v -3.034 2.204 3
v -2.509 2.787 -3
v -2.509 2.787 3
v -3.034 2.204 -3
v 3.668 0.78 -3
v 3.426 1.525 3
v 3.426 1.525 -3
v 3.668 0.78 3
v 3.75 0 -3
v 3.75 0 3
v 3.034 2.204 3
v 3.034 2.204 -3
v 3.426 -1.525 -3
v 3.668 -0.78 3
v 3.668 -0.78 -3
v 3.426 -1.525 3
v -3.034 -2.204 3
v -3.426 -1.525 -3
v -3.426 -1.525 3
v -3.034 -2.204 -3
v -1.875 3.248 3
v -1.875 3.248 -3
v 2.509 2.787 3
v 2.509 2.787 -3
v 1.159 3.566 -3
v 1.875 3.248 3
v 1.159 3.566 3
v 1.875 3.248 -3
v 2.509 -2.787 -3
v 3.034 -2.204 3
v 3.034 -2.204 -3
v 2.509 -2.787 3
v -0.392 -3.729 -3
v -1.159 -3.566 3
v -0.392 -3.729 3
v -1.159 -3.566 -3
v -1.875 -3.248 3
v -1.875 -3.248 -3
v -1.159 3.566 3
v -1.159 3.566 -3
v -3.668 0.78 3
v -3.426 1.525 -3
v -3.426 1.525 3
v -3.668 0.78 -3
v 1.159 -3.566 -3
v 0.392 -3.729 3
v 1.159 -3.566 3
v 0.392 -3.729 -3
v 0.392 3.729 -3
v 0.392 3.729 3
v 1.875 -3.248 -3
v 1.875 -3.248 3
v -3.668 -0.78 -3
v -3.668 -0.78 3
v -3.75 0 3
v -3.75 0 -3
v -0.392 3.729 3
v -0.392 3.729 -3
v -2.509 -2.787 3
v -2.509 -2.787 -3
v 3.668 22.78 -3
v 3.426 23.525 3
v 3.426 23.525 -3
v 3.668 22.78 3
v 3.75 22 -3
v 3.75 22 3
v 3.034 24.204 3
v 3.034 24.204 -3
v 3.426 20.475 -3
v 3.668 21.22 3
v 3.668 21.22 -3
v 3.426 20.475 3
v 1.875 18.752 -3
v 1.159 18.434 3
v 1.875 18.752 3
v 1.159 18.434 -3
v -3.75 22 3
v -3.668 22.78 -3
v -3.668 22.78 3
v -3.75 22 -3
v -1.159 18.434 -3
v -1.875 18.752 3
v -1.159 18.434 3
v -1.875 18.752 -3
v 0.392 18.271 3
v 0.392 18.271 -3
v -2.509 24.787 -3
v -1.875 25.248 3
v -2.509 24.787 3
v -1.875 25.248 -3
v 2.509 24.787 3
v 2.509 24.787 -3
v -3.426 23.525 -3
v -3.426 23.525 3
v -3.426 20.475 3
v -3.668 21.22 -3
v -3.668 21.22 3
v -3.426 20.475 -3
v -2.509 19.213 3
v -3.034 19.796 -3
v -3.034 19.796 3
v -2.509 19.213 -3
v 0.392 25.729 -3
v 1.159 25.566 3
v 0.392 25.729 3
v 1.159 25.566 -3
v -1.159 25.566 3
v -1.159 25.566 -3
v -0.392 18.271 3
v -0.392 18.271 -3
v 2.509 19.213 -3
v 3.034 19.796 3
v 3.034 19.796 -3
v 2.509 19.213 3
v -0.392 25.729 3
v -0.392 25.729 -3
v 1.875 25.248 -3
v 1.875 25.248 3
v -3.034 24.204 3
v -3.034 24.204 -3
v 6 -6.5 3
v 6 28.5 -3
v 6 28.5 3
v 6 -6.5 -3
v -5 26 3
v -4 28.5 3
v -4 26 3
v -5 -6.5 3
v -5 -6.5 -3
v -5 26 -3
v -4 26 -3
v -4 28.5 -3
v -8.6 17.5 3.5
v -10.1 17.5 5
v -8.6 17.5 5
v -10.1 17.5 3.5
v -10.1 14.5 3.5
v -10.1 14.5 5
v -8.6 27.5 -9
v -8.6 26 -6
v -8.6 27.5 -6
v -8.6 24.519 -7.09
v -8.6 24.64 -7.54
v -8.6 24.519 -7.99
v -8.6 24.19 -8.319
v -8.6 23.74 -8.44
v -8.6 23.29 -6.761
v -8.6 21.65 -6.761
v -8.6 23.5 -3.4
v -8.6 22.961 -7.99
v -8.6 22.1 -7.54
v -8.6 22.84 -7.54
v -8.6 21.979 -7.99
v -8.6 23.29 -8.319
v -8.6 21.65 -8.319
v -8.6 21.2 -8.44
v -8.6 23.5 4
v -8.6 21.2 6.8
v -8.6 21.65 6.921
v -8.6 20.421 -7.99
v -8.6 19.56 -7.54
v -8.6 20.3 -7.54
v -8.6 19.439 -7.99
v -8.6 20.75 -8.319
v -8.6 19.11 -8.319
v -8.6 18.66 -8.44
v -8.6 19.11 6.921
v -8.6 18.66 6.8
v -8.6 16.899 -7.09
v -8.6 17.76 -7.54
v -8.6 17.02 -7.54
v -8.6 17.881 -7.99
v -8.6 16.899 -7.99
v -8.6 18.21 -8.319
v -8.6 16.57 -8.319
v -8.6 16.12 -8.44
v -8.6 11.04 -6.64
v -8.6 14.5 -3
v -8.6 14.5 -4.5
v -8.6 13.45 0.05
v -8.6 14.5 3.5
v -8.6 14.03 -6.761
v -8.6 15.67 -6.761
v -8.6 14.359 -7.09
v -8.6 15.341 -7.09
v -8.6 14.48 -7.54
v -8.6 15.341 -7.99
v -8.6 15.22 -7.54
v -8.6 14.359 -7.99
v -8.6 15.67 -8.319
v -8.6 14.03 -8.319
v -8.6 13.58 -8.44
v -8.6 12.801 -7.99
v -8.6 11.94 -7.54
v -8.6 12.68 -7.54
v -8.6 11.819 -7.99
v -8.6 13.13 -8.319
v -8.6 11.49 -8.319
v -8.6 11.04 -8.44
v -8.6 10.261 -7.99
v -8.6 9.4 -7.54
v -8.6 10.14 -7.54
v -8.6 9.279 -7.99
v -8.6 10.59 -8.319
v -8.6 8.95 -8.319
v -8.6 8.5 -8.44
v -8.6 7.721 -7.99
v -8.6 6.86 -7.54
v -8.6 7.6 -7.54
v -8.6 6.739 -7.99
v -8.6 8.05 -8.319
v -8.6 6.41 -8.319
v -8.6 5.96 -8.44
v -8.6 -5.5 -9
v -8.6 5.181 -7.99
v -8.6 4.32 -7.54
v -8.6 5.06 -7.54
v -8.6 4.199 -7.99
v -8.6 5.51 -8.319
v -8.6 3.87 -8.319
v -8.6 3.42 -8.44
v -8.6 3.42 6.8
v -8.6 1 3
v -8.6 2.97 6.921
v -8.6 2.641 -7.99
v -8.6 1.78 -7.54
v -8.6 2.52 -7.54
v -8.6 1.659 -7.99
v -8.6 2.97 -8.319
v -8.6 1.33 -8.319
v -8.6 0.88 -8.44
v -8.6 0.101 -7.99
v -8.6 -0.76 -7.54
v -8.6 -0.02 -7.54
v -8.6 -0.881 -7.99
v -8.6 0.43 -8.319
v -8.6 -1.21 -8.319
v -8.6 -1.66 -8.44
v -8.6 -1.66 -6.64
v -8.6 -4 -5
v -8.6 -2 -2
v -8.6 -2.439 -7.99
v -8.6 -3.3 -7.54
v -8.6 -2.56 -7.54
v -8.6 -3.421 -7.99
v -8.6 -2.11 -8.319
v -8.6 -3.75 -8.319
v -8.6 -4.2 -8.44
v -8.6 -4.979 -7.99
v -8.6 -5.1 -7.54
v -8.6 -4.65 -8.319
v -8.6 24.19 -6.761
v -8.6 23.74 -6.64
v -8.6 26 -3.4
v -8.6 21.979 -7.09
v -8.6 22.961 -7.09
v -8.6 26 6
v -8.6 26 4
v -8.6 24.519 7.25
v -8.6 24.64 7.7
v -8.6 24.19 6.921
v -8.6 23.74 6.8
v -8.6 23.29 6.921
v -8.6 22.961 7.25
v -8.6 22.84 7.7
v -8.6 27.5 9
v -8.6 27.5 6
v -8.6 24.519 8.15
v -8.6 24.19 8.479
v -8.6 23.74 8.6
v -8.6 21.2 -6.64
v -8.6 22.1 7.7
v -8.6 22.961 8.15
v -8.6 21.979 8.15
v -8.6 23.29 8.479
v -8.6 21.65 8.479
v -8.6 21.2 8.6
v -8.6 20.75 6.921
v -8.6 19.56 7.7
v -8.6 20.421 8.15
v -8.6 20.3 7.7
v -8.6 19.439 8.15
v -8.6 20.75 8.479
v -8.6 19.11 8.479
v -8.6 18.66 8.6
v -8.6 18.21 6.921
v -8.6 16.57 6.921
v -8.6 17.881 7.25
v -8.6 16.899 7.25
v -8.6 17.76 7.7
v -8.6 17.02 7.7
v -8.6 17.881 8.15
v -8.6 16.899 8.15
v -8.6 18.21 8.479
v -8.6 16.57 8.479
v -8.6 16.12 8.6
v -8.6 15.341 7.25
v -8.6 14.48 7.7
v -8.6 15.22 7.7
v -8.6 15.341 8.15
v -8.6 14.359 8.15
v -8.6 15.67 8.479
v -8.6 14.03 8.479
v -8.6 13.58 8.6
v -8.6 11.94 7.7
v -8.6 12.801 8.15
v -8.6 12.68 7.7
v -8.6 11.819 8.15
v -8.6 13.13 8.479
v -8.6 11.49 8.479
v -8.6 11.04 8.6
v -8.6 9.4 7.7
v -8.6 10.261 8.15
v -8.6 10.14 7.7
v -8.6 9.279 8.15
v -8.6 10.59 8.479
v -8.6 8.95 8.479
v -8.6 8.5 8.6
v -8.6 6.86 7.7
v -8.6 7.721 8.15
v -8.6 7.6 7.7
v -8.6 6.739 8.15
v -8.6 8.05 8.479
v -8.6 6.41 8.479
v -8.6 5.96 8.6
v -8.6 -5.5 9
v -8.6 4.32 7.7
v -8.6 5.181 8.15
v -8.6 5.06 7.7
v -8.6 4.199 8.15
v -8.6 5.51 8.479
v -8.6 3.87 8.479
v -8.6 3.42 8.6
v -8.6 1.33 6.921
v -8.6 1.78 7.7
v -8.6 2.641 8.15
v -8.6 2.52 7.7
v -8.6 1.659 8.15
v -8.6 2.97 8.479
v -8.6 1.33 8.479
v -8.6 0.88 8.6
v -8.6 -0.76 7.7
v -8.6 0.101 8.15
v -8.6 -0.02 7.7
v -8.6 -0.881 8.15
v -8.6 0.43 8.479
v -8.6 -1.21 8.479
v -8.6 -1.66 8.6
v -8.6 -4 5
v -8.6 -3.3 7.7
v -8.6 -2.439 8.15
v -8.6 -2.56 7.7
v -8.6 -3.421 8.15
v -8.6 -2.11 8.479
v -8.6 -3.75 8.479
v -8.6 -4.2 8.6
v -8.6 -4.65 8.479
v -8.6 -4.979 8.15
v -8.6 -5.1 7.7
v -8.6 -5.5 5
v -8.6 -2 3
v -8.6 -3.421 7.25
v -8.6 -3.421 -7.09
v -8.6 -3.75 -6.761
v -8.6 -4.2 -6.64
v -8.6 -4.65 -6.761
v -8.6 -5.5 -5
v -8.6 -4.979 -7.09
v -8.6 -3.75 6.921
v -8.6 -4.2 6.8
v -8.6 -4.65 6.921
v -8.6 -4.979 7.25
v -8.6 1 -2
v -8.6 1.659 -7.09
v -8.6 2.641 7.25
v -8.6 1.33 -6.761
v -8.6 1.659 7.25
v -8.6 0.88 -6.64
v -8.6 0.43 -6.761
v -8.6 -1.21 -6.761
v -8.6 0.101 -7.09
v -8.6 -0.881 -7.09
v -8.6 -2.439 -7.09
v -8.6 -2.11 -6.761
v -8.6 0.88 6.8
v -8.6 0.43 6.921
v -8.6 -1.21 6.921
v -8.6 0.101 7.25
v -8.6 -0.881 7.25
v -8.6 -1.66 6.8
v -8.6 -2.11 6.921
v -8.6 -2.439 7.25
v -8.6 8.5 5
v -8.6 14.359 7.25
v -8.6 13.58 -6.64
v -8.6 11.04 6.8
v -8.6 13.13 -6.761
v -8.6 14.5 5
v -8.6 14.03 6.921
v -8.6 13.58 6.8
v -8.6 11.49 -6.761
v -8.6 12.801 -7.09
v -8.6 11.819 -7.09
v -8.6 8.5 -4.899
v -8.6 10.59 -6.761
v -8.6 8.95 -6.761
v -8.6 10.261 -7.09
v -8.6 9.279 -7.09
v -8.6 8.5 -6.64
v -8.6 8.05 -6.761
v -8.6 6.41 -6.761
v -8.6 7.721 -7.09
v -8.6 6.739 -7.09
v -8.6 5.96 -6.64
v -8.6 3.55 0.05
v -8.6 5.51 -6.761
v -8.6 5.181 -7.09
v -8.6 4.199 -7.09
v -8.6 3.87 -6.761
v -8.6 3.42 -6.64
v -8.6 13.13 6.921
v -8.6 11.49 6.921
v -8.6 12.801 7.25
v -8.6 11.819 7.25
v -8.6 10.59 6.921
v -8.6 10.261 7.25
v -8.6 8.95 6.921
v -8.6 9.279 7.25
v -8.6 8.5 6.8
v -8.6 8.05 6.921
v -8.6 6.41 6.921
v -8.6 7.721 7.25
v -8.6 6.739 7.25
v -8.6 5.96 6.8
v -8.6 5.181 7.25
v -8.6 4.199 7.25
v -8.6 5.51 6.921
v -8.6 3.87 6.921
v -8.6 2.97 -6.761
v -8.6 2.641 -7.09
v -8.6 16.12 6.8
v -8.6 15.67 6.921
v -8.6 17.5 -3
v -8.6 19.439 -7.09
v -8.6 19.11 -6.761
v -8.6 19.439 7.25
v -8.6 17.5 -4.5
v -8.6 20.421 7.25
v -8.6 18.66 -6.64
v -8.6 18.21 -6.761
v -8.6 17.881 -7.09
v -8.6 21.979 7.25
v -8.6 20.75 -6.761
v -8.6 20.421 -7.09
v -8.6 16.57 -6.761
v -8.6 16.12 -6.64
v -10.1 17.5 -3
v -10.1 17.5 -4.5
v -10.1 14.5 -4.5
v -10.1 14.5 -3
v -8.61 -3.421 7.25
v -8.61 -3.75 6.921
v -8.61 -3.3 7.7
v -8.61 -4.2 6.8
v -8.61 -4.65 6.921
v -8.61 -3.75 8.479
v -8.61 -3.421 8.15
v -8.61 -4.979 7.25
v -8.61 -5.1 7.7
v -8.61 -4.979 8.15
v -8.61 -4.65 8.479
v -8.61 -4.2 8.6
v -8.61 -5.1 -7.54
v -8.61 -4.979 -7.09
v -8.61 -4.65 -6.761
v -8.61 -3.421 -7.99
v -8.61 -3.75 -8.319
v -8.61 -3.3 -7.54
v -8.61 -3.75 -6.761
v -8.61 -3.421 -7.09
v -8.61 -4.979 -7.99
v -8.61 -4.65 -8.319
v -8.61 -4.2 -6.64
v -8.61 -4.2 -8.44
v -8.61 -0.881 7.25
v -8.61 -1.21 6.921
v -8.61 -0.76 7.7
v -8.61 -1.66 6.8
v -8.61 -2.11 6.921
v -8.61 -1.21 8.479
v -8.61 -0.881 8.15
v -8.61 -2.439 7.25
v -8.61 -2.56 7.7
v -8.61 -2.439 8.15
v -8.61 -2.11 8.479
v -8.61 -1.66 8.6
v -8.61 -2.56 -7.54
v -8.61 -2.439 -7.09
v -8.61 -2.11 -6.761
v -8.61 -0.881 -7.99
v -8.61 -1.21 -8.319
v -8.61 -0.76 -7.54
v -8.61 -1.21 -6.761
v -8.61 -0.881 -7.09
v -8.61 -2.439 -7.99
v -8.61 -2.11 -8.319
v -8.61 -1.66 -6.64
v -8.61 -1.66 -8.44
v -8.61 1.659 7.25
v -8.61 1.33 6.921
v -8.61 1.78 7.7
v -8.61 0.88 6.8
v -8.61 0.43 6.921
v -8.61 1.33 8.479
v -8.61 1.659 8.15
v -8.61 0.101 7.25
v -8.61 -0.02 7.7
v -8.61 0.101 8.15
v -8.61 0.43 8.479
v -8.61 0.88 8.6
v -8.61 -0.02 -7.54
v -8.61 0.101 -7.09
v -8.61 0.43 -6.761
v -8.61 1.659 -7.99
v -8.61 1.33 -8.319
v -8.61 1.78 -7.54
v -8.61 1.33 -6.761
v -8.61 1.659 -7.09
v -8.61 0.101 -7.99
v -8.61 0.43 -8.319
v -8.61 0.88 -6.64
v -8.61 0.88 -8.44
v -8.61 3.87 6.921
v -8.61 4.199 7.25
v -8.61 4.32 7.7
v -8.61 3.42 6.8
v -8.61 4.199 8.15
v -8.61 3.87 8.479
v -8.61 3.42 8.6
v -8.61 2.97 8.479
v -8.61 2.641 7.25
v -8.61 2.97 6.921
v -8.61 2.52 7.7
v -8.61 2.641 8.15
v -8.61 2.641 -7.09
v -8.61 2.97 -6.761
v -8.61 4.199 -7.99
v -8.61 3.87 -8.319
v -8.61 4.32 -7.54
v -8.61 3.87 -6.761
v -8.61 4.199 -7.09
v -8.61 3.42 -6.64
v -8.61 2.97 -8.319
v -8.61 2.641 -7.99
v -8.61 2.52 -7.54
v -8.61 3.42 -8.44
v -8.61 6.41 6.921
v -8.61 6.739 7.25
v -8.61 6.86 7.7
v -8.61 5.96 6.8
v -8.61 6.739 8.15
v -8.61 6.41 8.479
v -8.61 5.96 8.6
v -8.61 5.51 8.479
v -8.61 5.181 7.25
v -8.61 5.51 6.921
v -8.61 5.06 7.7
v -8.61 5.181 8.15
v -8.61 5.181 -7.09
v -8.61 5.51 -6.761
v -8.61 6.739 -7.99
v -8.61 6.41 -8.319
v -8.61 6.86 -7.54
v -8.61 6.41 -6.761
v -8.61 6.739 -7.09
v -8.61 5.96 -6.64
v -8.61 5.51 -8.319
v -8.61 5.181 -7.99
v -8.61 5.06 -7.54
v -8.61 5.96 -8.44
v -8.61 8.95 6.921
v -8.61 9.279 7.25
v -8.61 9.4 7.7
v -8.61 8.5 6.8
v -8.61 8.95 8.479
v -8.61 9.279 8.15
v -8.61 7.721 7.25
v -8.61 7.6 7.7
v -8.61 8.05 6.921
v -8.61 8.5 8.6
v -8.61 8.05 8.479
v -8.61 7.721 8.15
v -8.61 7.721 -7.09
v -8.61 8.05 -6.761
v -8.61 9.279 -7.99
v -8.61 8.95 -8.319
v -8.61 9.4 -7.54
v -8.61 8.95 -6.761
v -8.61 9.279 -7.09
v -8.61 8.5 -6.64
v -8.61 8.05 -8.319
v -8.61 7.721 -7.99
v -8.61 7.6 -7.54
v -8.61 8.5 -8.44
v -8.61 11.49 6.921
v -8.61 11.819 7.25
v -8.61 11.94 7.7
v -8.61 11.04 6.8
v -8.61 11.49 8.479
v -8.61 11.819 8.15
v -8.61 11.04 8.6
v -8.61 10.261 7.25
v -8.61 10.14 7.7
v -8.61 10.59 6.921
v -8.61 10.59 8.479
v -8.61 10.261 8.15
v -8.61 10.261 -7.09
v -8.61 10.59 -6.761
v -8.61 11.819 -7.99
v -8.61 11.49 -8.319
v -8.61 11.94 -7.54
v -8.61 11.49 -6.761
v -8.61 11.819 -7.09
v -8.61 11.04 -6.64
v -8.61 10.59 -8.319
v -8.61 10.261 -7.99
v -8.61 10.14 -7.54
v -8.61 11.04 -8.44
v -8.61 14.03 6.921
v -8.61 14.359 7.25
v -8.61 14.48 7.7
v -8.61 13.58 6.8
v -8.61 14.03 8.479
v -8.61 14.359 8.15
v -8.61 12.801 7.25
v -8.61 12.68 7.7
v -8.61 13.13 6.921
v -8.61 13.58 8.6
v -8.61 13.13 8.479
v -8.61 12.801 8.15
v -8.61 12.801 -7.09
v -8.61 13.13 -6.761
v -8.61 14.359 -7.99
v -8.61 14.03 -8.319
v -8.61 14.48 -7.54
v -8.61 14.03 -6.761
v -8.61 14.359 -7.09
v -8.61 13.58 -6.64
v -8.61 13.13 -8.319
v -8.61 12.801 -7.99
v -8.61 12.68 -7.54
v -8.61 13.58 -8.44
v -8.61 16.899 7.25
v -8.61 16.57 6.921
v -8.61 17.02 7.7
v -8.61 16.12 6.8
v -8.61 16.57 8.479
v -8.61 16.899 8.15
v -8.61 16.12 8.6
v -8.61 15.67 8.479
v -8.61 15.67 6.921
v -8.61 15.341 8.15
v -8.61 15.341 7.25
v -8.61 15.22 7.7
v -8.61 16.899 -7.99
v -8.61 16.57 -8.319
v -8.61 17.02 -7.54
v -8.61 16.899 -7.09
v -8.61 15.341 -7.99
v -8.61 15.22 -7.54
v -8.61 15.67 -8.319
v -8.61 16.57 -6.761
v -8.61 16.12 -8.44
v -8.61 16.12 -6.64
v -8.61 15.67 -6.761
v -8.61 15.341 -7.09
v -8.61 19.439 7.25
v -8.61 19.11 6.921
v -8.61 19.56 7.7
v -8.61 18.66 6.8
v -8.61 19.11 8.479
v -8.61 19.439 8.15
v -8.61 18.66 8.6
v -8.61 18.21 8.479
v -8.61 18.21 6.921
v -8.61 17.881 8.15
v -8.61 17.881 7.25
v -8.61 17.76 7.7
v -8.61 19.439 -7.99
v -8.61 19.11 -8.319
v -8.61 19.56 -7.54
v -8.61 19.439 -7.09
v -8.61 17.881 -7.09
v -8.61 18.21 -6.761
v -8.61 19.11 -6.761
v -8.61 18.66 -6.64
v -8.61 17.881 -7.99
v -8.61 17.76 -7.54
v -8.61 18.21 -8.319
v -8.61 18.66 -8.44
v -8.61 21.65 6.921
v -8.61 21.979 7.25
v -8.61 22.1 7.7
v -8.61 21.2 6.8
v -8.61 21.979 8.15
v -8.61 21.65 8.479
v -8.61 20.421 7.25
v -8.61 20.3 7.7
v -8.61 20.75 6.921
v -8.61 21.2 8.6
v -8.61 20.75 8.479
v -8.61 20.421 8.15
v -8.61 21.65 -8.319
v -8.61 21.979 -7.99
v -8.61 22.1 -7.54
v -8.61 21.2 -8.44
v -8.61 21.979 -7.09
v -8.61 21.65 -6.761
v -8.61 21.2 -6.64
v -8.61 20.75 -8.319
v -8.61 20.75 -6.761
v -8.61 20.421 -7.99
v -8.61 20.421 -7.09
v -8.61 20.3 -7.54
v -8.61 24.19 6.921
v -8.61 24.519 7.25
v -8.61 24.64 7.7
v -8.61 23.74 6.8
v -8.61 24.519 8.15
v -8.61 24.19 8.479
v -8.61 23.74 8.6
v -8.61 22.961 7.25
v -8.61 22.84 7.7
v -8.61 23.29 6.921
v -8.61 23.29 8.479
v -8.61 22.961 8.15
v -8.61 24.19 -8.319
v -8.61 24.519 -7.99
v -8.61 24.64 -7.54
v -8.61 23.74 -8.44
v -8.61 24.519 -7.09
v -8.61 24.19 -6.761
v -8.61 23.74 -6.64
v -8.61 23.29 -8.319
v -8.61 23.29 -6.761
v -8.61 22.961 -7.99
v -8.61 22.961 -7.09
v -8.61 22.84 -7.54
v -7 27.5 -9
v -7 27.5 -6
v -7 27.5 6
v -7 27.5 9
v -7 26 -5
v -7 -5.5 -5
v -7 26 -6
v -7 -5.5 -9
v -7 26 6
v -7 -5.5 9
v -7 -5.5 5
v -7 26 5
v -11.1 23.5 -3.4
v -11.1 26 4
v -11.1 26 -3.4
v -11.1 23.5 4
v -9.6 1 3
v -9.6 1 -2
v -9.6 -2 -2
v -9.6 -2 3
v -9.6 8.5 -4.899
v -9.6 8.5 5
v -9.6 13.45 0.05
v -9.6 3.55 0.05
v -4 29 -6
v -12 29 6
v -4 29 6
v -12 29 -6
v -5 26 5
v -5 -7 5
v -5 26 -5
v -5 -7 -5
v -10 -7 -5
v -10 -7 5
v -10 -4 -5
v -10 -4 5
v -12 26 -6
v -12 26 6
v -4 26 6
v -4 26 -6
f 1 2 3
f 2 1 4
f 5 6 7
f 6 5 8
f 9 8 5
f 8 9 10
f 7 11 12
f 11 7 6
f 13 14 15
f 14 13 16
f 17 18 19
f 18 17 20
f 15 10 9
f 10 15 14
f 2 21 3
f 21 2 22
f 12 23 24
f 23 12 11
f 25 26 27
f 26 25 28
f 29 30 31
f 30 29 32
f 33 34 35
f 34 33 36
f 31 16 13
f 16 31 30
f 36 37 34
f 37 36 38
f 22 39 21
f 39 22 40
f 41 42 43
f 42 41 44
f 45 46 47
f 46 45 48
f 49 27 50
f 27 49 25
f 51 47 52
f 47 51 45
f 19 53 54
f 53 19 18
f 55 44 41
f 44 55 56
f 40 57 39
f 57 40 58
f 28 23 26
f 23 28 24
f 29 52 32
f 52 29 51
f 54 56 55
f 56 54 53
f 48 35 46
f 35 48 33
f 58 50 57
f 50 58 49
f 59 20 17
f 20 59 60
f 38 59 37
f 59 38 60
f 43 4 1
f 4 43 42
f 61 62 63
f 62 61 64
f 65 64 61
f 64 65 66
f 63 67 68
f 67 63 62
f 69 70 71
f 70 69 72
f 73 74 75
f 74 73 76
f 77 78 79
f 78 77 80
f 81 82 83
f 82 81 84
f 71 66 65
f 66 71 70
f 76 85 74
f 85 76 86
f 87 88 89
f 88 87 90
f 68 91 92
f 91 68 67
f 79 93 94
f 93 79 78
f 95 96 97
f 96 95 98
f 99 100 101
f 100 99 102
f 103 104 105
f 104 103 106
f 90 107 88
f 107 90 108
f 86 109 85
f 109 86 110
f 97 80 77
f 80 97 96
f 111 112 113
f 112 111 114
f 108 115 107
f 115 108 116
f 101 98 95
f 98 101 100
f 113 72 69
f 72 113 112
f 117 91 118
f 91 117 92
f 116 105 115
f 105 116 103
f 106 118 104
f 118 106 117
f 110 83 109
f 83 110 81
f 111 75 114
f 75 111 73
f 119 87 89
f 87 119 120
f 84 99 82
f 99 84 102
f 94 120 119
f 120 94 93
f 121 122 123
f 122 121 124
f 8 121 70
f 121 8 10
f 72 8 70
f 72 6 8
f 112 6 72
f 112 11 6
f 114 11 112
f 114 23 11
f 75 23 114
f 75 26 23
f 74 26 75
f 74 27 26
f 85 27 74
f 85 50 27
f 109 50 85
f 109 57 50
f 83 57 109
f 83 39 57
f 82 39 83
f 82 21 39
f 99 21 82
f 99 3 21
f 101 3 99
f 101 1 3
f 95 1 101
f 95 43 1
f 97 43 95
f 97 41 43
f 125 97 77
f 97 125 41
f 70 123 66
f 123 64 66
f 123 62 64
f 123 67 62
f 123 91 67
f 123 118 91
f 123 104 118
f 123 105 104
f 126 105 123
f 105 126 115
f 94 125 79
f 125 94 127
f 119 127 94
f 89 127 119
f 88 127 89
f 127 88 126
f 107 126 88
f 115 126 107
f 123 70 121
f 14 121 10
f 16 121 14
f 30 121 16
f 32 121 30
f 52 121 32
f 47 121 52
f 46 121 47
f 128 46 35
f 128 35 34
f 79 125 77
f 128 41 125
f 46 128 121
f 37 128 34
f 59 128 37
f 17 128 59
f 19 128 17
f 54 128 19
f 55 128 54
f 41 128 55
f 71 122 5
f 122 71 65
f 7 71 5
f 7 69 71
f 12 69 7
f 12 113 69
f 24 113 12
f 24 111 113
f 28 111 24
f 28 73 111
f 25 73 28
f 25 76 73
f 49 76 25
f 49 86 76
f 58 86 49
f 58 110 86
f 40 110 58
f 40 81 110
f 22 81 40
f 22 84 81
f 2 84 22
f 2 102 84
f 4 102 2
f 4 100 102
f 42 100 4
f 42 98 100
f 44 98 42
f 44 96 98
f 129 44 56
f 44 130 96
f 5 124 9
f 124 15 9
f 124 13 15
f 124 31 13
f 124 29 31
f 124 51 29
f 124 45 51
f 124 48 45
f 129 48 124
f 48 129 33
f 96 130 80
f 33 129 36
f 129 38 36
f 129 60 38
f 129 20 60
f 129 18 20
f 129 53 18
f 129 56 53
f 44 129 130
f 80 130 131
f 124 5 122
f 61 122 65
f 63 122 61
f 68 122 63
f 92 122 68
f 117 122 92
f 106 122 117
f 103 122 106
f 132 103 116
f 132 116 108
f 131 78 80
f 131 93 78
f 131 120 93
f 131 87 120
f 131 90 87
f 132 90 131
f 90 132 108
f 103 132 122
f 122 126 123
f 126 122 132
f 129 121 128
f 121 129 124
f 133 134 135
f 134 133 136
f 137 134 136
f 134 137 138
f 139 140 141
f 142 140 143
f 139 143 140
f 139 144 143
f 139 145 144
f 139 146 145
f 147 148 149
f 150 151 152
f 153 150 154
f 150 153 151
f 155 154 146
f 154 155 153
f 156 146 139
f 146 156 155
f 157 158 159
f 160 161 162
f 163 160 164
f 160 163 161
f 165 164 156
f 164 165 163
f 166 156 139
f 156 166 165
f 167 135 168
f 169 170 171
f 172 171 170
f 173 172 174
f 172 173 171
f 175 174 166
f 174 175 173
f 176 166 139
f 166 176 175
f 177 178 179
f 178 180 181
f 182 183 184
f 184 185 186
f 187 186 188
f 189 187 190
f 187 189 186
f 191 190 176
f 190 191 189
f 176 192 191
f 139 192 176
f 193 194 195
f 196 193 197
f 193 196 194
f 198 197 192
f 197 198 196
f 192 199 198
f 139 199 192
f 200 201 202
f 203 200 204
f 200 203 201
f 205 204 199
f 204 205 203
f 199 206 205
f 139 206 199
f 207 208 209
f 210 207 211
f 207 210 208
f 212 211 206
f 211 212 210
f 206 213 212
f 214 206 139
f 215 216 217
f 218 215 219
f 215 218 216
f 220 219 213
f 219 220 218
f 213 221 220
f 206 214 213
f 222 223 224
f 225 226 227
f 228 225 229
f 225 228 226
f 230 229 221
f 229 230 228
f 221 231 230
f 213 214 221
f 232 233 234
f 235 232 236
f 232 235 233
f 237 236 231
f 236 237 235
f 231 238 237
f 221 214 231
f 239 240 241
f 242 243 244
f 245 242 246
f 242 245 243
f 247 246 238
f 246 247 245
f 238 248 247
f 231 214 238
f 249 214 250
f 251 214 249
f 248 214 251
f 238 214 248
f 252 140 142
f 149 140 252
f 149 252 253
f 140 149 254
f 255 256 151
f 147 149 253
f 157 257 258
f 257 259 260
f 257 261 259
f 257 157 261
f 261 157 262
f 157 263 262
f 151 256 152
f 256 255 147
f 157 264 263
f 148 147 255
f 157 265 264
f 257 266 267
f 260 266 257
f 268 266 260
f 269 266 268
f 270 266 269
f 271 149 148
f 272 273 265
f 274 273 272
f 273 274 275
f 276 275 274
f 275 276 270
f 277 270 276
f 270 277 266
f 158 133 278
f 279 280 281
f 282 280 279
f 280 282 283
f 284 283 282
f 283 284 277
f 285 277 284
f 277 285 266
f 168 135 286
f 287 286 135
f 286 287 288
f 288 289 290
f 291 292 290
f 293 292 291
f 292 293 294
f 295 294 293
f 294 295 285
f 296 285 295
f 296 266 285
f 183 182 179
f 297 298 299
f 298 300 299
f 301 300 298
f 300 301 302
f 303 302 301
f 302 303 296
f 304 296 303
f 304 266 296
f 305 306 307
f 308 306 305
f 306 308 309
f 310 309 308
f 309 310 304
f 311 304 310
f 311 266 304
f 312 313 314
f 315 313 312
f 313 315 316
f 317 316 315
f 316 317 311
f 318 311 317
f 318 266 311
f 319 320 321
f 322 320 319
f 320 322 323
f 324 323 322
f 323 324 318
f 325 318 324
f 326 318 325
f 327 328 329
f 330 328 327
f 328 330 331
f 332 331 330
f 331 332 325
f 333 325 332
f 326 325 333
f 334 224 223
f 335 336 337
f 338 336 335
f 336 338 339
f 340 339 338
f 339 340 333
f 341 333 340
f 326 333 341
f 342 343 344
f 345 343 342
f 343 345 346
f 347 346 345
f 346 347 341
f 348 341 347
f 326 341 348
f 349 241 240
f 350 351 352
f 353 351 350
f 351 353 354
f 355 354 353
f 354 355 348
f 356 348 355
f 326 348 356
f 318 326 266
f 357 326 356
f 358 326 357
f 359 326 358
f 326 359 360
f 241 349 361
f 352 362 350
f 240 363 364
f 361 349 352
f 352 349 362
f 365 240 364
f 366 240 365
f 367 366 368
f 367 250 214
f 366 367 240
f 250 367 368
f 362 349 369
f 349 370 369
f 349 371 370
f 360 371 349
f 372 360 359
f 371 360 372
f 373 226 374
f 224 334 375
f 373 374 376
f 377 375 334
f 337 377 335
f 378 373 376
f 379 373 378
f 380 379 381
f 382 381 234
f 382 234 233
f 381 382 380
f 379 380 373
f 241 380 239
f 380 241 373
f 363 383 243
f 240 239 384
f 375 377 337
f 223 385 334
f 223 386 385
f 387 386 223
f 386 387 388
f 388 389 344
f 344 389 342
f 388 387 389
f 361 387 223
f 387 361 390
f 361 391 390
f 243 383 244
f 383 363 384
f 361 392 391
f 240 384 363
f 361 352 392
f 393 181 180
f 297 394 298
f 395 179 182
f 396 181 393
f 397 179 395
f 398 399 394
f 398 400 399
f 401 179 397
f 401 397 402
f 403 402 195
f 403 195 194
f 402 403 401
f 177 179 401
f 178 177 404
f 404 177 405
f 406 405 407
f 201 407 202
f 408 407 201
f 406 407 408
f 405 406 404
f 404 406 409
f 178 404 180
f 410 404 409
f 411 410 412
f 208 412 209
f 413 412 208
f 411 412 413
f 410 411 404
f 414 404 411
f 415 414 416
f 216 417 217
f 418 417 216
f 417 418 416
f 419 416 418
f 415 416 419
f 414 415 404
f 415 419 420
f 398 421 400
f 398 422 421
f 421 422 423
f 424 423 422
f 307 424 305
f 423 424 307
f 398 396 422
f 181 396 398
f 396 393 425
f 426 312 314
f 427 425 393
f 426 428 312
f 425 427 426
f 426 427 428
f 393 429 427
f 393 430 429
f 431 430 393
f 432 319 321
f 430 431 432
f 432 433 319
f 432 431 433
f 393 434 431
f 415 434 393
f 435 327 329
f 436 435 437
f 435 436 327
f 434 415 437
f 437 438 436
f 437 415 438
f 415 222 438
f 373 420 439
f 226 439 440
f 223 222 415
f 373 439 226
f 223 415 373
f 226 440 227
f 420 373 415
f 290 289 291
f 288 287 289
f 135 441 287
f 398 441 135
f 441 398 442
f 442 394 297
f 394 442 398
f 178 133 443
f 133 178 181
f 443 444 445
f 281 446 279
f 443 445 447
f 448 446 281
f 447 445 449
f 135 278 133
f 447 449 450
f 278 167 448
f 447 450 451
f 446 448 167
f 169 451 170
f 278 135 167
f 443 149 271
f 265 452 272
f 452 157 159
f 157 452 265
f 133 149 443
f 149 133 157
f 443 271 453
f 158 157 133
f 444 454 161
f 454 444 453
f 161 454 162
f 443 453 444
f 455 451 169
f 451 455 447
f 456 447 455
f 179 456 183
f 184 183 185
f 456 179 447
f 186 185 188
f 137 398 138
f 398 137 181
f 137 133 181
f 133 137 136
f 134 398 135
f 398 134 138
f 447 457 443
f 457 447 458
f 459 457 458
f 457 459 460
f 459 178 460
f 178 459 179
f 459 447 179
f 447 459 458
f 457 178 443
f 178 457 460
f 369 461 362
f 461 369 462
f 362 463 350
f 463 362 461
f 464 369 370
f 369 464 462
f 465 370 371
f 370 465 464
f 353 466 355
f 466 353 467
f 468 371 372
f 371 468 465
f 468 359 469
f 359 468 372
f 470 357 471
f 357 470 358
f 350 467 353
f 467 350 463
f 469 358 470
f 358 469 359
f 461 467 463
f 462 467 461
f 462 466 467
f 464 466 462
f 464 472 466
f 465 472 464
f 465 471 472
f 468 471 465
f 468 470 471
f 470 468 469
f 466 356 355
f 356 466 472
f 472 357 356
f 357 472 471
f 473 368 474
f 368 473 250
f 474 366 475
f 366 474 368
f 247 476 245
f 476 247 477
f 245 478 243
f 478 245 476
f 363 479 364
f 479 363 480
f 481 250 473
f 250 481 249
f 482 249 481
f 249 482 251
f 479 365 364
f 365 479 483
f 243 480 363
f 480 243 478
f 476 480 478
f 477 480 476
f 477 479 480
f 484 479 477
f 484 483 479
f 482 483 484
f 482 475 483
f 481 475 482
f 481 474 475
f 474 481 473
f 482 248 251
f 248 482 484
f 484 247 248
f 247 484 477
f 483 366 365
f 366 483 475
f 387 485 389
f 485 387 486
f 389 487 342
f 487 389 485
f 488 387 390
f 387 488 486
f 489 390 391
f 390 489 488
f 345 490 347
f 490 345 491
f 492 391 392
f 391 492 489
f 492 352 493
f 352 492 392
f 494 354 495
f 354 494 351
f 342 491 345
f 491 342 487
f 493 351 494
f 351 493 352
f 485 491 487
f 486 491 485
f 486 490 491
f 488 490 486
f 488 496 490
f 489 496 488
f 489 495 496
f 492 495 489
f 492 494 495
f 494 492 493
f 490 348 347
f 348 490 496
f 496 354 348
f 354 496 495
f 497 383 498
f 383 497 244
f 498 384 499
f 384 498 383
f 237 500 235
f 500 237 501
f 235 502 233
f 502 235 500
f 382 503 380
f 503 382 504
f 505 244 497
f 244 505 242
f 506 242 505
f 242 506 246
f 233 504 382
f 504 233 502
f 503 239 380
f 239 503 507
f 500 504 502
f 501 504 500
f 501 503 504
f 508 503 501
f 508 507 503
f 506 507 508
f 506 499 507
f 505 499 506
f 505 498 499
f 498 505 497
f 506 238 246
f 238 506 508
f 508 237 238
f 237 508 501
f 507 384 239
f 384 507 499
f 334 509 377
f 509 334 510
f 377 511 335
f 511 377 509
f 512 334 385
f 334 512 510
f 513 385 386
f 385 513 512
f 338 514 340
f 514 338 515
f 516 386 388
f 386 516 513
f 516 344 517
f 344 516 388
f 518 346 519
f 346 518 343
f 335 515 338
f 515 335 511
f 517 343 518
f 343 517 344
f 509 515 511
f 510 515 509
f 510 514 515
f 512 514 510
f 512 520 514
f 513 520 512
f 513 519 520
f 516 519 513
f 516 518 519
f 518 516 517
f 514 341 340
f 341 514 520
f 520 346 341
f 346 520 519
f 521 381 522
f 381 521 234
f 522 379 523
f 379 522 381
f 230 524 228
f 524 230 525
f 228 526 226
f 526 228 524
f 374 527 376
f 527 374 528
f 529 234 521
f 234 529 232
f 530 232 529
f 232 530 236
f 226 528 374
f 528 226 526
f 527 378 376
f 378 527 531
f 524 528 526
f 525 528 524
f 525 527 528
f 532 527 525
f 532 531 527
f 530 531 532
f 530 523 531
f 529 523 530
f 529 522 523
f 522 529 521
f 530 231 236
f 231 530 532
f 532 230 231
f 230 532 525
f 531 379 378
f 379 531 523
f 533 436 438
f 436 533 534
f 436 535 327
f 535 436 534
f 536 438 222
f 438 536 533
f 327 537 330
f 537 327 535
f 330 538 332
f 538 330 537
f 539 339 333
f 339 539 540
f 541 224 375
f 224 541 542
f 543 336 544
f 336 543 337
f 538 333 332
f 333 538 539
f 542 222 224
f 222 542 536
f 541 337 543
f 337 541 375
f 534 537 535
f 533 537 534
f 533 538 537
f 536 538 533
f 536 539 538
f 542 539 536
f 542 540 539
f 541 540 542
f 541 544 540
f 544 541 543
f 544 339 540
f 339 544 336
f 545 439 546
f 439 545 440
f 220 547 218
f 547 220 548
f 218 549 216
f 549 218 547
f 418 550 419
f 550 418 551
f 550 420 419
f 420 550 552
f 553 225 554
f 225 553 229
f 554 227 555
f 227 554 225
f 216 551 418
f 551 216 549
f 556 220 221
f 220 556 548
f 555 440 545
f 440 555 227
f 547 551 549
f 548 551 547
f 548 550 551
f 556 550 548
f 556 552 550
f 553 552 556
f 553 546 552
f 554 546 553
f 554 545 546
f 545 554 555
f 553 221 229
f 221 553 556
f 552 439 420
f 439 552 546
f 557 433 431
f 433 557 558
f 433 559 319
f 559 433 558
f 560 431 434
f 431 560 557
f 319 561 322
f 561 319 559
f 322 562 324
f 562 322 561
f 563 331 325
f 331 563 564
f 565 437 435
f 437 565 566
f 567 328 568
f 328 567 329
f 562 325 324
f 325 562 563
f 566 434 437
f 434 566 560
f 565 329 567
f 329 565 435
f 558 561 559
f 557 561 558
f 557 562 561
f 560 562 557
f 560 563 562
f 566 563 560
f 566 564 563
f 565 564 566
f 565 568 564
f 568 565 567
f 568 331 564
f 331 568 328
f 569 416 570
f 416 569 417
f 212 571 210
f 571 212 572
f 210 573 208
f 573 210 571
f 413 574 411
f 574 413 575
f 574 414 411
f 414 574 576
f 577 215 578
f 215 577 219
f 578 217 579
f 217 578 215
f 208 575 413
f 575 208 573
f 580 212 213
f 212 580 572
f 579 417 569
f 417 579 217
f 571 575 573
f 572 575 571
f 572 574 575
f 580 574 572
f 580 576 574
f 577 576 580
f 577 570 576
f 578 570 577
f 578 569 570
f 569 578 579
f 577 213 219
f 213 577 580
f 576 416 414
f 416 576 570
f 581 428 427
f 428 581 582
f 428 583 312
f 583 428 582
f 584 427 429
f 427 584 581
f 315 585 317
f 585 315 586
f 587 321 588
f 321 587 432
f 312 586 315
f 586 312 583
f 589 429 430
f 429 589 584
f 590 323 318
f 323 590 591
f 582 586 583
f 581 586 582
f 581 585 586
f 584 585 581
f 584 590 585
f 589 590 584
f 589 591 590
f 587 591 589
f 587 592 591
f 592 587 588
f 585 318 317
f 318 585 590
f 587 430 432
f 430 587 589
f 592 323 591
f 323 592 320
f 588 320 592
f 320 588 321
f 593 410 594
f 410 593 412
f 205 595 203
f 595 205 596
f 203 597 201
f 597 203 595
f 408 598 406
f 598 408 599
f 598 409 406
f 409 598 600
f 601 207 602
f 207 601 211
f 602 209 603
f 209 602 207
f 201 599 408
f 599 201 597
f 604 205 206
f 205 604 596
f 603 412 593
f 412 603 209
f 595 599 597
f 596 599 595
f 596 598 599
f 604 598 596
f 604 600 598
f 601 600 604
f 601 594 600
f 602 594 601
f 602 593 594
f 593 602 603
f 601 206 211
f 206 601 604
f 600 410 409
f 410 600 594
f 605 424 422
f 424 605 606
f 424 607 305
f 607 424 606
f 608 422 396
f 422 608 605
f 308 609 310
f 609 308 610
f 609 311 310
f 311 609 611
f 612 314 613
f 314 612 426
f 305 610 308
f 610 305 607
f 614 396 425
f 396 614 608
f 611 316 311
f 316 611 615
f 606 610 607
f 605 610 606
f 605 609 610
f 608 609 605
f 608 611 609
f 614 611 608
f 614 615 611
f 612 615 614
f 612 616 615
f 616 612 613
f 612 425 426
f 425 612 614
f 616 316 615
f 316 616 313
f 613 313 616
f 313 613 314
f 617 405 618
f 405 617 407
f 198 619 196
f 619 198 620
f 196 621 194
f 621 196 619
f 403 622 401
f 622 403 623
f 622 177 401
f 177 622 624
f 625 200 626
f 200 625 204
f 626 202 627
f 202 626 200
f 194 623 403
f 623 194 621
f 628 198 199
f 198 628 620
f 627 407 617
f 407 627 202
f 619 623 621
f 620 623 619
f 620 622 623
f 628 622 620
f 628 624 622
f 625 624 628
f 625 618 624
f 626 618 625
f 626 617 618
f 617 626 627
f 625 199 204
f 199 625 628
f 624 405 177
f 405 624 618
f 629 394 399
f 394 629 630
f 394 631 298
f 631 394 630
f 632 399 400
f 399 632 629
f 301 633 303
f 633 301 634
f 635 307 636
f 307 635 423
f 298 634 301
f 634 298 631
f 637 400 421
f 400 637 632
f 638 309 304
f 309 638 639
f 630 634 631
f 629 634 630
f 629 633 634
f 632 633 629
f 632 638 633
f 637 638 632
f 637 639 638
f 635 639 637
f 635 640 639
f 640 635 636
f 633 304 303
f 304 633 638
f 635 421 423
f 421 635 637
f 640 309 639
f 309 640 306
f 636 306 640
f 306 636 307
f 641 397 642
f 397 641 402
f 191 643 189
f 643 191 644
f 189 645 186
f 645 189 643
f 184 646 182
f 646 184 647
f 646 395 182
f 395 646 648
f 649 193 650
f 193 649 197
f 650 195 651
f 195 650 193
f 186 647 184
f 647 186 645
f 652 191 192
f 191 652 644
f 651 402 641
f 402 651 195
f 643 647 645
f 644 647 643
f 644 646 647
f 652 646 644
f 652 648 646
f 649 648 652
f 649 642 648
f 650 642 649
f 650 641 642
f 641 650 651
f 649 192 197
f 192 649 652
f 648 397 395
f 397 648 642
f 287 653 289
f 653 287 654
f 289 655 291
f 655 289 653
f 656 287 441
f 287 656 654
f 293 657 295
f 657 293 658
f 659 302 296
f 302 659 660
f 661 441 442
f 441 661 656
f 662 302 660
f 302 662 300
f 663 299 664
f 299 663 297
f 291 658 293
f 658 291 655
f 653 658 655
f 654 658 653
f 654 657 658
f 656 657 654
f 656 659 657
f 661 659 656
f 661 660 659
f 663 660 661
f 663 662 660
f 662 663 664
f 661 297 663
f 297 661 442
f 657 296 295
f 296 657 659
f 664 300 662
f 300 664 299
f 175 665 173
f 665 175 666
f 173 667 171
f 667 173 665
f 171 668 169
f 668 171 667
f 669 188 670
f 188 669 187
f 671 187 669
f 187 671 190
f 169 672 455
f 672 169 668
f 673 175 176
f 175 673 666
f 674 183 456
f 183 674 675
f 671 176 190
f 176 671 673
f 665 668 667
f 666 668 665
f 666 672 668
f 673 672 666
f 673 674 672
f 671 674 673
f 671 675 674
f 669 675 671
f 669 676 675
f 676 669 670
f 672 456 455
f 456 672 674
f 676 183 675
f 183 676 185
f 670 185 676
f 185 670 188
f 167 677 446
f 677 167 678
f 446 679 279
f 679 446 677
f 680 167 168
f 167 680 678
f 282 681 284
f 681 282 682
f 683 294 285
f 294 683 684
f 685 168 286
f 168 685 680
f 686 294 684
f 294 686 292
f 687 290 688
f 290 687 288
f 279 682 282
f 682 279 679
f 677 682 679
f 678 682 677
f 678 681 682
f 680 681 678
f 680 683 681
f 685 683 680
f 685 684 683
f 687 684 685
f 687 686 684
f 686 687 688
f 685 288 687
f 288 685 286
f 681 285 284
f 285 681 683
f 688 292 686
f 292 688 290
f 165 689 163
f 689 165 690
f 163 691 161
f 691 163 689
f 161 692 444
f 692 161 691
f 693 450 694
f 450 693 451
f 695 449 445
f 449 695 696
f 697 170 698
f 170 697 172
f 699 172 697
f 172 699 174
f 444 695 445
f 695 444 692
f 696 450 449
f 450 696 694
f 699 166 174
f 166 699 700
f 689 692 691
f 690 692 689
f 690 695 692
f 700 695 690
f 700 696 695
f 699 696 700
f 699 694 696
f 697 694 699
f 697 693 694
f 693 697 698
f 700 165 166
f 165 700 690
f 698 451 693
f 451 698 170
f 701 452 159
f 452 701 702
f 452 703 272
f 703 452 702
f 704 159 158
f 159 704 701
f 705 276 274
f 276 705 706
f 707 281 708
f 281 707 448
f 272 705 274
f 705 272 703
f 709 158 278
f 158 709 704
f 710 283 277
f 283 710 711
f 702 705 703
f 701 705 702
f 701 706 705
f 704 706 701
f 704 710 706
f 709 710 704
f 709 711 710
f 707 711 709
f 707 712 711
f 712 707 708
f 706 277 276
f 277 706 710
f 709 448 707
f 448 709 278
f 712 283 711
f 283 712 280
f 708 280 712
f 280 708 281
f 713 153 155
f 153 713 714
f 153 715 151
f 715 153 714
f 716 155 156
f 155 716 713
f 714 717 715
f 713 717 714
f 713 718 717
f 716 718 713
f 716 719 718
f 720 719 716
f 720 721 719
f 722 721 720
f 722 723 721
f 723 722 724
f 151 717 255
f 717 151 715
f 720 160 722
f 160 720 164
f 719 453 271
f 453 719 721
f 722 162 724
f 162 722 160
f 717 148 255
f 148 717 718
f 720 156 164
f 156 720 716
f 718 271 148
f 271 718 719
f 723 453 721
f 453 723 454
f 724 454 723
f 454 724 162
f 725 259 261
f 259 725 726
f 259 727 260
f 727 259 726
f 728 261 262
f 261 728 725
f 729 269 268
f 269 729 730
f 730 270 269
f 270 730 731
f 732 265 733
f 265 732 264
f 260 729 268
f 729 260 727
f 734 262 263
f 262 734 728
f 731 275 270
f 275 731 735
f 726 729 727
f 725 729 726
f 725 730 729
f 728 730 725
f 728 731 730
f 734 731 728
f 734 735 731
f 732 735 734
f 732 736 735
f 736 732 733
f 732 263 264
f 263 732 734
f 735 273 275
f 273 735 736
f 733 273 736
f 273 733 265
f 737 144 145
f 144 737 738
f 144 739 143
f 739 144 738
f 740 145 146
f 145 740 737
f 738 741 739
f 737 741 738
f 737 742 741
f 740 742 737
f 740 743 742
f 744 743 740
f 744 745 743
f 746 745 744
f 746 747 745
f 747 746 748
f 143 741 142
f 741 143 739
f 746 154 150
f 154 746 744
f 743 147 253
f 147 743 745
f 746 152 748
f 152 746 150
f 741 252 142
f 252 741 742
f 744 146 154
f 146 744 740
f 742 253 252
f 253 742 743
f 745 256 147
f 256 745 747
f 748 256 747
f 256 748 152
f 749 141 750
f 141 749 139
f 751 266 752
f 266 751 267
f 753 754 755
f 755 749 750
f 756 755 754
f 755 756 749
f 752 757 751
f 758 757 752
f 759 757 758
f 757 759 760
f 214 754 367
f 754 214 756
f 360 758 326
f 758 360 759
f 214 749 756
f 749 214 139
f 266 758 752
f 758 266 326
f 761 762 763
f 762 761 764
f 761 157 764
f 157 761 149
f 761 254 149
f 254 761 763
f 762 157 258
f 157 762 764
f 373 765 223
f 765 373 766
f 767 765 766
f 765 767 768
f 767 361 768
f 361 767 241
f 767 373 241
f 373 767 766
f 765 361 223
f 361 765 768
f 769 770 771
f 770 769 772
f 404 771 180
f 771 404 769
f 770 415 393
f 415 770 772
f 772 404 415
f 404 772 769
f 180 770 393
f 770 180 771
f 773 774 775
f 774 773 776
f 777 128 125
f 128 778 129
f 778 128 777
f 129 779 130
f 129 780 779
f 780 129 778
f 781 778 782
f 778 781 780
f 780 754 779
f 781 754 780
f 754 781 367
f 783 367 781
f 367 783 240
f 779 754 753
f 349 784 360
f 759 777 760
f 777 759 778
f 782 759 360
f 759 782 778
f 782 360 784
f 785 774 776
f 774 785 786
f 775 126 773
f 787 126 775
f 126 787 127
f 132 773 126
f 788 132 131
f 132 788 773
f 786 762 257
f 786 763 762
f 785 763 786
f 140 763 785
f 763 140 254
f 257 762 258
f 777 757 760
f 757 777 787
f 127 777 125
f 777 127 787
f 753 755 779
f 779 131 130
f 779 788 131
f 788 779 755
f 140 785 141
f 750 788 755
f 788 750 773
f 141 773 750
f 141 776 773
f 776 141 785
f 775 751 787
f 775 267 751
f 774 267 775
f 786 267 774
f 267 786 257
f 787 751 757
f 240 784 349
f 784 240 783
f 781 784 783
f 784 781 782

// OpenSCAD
module addon_holder(){
  difference(){
    translate([0, 11, 0])cube([12, 35, 6], center = true);
    union(){
      cylinder(r = 7.5 / 2, h = 20, center = true, $fs = 0.01);
      translate([0, 22, 0])cylinder(r = 7.5 / 2, h = 20, center = true, $fs = 0.01);
    }
  }
}

module promicro(){
  color("darkblue")cube([33, 18, 1.6]);
  color("lightgray")translate([29, 5, 1.6])cube([5, 7.4, 2.5]);
  color("lightgray")translate([3.5, 6, 1.6])cube([3, 5, 1]);
  color("darkorange"){
    translate([20, 4, 1.6])cube([3, 1.5, 1.5]);
    translate([20, 12, 1.6])cube([3, 1.5, 1.5]);
  }
  color("#222")translate([14, 4, 1.6])rotate([0, 0, 45])cube([7, 7, 1]);
  for(i = [0:11]){
    for(j = [0:1]){
      color("Khaki")translate([1.3 + i * 2.54, 1.3 + j * 15.24, 1.6])cylinder(r = 0.9, h = 0.01, $fs = 0.5);
    }
  }
}

module promicro_holder(){
  union(){
    color("green")addon_holder();
    translate([-6, 11, 0]){
      rotate([90, 180, -90]){
        color("green")cube([33 + 3, 10, 2], center = true);
        color("green")translate([33 / 2, 0, 2])cube([3, 12, 8], center = true);
        color("green")translate([-33 / 2, 0, 2])cube([3, 10, 4], center = true);

        translate([-33 / 2, -18 / 2, 1])promicro();
      }
    }
  }
}

promicro_holder();
